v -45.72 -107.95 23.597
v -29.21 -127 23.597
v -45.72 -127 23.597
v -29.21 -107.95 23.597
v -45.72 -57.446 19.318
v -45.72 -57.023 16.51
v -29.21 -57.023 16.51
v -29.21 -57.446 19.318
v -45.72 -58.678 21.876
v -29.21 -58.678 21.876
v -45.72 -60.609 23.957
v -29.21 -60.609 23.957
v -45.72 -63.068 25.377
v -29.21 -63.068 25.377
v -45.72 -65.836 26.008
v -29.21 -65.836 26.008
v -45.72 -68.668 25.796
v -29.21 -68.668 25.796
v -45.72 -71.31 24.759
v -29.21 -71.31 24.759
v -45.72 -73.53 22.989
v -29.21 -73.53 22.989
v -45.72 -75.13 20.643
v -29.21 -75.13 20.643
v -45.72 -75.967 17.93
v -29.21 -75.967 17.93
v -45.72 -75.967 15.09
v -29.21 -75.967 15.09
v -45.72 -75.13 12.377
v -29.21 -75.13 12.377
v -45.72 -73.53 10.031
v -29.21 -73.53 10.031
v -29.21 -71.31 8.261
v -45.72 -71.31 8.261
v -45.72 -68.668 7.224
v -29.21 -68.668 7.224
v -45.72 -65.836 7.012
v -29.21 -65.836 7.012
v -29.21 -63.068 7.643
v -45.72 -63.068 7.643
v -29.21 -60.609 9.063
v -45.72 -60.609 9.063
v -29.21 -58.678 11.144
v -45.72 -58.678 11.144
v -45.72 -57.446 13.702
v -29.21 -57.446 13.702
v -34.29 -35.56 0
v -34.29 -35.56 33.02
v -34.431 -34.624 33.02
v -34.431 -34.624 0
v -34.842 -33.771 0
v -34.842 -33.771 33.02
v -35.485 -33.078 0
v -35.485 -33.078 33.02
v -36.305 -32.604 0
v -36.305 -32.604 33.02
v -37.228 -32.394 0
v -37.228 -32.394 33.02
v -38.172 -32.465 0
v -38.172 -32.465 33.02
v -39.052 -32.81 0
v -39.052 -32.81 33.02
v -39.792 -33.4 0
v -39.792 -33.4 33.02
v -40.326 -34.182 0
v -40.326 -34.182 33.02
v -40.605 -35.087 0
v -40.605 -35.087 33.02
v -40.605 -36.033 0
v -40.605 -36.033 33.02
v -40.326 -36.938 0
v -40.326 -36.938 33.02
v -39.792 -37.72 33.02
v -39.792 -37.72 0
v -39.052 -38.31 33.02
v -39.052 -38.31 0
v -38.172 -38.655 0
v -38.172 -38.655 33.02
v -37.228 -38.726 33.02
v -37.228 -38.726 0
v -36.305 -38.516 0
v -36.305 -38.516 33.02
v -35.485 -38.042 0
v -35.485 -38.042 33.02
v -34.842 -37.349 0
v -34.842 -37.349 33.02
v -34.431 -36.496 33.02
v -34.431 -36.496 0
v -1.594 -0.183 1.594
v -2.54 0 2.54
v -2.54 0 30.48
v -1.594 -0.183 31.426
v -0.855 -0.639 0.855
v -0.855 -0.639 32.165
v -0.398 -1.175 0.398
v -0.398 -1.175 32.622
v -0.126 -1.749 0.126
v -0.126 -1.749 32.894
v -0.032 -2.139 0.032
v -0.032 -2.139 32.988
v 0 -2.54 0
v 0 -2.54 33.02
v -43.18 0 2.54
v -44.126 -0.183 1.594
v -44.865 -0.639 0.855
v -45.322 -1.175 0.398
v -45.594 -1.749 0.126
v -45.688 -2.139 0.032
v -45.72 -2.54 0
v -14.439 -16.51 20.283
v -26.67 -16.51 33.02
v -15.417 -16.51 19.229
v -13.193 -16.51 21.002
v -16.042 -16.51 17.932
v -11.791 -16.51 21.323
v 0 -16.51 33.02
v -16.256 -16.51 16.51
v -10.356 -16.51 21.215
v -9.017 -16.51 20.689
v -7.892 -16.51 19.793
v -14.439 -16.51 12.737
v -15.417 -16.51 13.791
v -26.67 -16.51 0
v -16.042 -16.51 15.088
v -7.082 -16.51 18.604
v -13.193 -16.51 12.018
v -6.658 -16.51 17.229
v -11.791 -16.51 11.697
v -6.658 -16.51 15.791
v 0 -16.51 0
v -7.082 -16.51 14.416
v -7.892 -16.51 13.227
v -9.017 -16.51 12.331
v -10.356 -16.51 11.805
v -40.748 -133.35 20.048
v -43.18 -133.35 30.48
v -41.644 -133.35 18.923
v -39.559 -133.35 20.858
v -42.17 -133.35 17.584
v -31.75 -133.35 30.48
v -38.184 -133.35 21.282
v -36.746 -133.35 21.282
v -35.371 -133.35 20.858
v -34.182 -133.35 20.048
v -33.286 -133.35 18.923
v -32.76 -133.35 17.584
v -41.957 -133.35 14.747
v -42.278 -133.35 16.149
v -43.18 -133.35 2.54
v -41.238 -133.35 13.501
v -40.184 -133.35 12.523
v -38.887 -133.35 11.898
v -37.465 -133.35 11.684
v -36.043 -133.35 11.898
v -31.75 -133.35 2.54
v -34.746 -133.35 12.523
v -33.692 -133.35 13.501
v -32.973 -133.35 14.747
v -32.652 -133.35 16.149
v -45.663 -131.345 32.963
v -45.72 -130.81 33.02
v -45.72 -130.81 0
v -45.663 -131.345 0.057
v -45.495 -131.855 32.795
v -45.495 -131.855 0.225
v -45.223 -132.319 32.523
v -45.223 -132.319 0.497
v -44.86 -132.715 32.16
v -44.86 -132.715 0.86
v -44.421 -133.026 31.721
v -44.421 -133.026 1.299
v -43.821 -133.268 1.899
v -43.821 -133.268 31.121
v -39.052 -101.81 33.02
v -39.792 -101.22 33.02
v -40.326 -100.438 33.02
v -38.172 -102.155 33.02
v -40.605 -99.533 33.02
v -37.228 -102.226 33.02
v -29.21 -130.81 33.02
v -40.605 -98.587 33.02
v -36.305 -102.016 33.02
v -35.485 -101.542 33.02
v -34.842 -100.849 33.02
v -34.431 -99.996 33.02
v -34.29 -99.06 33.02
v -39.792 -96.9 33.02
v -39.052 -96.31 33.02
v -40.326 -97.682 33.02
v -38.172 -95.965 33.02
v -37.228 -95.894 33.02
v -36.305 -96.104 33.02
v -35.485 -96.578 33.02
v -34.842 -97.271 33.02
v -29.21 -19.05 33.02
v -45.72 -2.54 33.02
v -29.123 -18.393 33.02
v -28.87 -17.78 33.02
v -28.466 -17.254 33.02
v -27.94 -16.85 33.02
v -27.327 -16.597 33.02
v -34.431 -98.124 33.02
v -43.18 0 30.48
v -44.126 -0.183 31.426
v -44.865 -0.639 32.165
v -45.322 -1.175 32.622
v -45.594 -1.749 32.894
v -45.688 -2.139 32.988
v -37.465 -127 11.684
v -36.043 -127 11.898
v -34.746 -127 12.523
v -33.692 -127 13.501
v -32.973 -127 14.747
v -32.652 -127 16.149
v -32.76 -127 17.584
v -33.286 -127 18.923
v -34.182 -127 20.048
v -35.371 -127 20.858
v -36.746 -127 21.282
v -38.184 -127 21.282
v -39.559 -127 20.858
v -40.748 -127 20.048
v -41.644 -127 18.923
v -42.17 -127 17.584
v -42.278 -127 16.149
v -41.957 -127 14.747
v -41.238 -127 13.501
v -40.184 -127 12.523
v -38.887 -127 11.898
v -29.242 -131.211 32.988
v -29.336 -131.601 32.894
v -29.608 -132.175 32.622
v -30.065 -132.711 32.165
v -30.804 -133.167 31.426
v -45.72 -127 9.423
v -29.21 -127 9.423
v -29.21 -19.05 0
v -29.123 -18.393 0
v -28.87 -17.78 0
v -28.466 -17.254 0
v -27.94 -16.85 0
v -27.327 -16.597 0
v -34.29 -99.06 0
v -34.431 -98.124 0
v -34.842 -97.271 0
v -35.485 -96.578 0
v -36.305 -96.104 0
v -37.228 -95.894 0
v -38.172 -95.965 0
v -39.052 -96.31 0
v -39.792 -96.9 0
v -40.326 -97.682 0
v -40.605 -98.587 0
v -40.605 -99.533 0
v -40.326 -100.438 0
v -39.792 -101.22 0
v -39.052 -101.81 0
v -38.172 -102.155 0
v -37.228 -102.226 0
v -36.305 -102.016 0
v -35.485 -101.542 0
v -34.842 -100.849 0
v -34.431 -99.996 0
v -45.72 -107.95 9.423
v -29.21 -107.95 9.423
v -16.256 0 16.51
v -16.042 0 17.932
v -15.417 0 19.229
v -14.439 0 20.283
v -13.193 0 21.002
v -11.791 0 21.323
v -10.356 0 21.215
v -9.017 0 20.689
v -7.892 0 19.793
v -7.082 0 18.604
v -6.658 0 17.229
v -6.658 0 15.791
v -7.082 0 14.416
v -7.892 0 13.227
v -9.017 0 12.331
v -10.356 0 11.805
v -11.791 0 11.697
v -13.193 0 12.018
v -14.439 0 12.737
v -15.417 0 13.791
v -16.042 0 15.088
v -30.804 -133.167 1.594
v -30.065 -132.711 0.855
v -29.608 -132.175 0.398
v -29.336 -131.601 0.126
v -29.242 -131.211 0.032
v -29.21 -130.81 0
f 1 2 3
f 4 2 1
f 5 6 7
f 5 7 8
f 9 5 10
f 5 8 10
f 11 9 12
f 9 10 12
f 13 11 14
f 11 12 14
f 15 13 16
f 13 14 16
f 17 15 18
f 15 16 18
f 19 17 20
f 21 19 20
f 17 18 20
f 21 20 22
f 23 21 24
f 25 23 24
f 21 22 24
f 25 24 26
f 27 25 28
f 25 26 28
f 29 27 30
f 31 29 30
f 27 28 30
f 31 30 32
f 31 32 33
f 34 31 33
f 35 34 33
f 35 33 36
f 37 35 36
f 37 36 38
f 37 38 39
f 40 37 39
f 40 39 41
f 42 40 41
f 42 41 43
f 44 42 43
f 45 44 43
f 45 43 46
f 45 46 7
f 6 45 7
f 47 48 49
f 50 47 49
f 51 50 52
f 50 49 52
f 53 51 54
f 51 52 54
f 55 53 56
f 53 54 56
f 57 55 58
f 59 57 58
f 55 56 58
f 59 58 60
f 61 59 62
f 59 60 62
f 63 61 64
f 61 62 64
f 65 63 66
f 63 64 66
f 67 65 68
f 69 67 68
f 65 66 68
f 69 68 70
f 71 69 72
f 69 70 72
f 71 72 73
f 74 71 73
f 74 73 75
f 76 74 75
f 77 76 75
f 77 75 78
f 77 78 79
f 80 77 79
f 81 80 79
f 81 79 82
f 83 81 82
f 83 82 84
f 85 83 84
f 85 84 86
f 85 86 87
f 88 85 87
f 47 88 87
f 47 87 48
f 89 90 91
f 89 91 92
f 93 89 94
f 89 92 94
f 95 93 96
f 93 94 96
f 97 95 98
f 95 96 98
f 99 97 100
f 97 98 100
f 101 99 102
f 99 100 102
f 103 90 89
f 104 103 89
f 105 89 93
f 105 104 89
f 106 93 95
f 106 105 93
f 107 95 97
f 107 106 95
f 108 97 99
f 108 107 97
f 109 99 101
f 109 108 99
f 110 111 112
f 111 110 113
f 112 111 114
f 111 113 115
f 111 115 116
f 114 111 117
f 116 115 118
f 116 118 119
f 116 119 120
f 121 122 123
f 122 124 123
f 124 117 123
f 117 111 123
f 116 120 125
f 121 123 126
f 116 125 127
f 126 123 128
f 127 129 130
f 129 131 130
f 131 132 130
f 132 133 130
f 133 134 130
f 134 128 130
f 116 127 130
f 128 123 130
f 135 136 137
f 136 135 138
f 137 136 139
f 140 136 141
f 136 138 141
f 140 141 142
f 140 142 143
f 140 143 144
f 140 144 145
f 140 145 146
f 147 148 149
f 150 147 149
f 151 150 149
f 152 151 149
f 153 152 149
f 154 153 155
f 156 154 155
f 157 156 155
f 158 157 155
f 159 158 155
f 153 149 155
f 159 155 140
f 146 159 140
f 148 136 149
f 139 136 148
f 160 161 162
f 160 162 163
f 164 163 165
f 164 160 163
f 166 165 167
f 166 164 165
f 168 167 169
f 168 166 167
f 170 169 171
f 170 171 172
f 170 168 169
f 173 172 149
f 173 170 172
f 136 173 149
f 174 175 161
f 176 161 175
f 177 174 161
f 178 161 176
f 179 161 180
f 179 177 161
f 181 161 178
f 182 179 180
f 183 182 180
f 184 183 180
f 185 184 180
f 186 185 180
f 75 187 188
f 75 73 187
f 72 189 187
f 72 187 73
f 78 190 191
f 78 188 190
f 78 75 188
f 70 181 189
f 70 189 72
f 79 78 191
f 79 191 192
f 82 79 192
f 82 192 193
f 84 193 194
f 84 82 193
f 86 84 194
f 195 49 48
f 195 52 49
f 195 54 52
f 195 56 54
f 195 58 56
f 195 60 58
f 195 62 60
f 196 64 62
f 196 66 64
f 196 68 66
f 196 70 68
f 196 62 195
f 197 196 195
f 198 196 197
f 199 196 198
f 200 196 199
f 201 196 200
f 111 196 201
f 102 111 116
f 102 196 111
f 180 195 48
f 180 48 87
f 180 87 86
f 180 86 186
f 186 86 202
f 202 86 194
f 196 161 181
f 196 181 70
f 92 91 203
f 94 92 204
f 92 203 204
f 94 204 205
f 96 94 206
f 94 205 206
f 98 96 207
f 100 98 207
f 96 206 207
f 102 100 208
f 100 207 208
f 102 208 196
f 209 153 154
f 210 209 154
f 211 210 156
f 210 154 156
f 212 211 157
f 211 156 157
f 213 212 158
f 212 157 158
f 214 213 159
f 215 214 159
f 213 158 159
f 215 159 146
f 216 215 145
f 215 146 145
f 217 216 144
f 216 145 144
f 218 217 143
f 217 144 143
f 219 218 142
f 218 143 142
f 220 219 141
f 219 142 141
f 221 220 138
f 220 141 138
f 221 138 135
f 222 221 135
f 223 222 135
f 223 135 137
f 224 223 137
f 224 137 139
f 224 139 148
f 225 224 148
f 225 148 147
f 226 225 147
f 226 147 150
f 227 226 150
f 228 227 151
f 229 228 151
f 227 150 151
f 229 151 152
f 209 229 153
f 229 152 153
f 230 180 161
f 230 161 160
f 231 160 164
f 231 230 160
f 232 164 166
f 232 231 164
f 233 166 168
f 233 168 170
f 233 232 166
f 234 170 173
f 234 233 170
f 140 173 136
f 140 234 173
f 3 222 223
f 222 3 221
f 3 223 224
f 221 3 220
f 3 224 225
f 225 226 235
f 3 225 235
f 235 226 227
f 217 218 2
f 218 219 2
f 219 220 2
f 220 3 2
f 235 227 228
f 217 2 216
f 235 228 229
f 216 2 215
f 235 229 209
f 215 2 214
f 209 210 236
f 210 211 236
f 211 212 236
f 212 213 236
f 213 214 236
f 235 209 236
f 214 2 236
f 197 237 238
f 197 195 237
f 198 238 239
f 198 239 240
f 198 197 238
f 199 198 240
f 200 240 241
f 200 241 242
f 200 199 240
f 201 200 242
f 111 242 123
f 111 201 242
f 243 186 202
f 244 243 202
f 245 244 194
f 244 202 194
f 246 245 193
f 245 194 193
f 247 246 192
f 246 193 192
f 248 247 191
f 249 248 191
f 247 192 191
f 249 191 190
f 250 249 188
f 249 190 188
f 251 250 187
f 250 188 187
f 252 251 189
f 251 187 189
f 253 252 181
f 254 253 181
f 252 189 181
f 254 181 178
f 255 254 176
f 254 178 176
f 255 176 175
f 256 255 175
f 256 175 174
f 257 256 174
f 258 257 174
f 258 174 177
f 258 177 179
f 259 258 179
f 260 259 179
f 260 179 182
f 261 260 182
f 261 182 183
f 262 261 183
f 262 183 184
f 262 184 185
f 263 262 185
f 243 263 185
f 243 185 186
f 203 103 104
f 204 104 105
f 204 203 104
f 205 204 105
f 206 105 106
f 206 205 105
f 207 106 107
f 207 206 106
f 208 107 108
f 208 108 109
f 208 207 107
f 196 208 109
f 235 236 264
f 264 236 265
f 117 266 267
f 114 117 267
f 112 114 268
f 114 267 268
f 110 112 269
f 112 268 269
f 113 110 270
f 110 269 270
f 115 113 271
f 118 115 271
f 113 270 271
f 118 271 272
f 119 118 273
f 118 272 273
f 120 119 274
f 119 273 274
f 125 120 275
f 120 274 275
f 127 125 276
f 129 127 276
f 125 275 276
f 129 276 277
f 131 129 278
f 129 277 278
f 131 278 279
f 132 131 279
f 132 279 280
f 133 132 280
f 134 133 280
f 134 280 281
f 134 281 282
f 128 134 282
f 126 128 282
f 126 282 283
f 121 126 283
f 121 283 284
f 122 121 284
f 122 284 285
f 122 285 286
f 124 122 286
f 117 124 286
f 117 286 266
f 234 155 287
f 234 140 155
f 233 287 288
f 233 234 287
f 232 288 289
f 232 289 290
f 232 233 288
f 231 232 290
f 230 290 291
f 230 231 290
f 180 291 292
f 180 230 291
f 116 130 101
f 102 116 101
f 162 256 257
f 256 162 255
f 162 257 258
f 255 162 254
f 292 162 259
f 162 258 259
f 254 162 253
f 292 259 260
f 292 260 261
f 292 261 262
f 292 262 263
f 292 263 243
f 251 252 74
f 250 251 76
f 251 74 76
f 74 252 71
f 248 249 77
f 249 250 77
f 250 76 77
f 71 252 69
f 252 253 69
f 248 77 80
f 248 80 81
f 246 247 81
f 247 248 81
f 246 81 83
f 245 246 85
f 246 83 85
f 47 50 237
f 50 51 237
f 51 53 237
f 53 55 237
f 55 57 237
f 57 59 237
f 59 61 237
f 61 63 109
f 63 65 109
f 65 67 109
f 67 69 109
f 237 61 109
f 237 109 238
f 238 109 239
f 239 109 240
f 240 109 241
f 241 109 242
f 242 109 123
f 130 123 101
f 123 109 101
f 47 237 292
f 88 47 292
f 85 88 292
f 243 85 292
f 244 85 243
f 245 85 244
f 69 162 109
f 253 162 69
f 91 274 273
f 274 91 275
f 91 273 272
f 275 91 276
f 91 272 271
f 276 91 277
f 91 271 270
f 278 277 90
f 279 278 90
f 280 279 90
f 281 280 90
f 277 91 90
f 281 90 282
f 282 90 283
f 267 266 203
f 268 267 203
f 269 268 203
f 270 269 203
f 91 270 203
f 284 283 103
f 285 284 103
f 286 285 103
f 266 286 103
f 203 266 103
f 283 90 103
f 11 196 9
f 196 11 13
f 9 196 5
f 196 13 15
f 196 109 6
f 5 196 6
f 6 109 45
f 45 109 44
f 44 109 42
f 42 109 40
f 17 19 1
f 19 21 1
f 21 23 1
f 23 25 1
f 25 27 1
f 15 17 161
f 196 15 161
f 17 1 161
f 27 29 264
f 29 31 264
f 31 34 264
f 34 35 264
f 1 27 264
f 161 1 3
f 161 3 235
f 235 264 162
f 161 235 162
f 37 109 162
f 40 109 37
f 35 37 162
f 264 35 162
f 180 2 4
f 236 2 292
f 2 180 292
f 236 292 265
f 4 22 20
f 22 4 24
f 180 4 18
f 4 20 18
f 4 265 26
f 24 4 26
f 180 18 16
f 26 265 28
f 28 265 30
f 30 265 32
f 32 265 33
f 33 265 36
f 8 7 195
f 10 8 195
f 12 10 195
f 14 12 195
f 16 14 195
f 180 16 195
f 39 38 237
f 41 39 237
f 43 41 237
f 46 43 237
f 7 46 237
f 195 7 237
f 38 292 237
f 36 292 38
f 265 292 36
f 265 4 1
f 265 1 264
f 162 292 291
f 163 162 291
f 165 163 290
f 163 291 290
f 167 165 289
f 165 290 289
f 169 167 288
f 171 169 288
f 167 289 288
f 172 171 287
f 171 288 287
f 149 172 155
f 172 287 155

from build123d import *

# Parameters (mm, degrees)
BOSS_EXTRUDE1_DEPTH = 33.02
FILLET1_R           = 2.54
SKETCH4_R           = 9.525
CUT_EXTRUDE1_DEPTH  = 141.448449618
SKETCH5_R           = 3.175
CUT_EXTRUDE2_DEPTH  = 145.785570068
SKETCH6_W           = 14.1732
SKETCH6_H           = 19.05
CUT_EXTRUDE3_DEPTH  = 141.448449618
SKETCH7_R           = 4.826
CUT_EXTRUDE4_DEPTH  = 6.35
SKETCH8_R           = 4.826
CUT_EXTRUDE5_DEPTH  = 145.785570068
FILLET2_R           = 2.54
FILLET3_R           = 2.54


with BuildPart() as part:
    # Sketch1 → Boss-Extrude1 (new body)
    with BuildSketch(Plane.XY):
        Polygon((0, 0), (-45.72, 0), (-45.72, -133.35), (-29.21, -133.35), (-29.21, -16.51), (0, -16.51), align=None)
    extrude(amount=BOSS_EXTRUDE1_DEPTH)

    # Fillet1
    fillet1_edges = [part.edges().sort_by_distance(p)[0] for p in [
        (-45.72, 0, 16.51),
        (0, 0, 16.51),
        (-22.86, 0, 33.02),
        (-22.86, 0, 0),
    ]]
    fillet(fillet1_edges, radius=FILLET1_R)

    # Sketch4 → Cut-Extrude1 (cut, through all)
    with BuildSketch(Plane(origin=(-29.21, 0, 0), x_dir=(0, 0, -1), z_dir=(1, 0, 0))):
        with Locations(Location((-16.51, -66.548, 0), (0, 0, 90))):
            Circle(SKETCH4_R)
    extrude(amount=-CUT_EXTRUDE1_DEPTH, mode=Mode.SUBTRACT)

    # Sketch5 → Cut-Extrude2 (cut, through all)
    with BuildSketch(Plane.XY.offset(33.02)):
        with Locations((-37.465, -35.56)):
            Circle(SKETCH5_R)
        with Locations((-37.465, -99.06)):
            Circle(SKETCH5_R)
    extrude(amount=-CUT_EXTRUDE2_DEPTH, mode=Mode.SUBTRACT)

    # Sketch6 → Cut-Extrude3 (cut, through all)
    with BuildSketch(Plane(origin=(-29.21, 0, 0), x_dir=(0, 0, -1), z_dir=(1, 0, 0))):
        with Locations((-16.51, -117.475)):
            Rectangle(SKETCH6_W, SKETCH6_H)
    extrude(amount=-CUT_EXTRUDE3_DEPTH, mode=Mode.SUBTRACT)

    # Sketch7 → Cut-Extrude4 (cut)
    with BuildSketch(Plane.XZ.offset(133.35)):
        with Locations(Location((-37.465, 16.51, 0), (0, 0, 270))):
            Circle(SKETCH7_R)
    extrude(amount=-CUT_EXTRUDE4_DEPTH, mode=Mode.SUBTRACT)

    # Sketch8 → Cut-Extrude5 (cut, through all)
    with BuildSketch(Plane(origin=(0, 0, 0), x_dir=(1, 0, 0), z_dir=(0, 1, 0))):
        with Locations(Location((-11.43, -16.51, 0), (0, 0, 180))):
            Circle(SKETCH8_R)
    extrude(amount=-CUT_EXTRUDE5_DEPTH, mode=Mode.SUBTRACT)

    # Fillet2
    fillet2_edges = [part.edges().sort_by_distance(p)[0] for p in [
        (-29.21, -133.35, 16.51),
        (-45.72, -133.35, 16.51),
        (-37.465, -133.35, 33.02),
        (-37.465, -133.35, 0),
    ]]
    fillet(fillet2_edges, radius=FILLET2_R)

    # Fillet3
    fillet3_edges = [part.edges().sort_by_distance(p)[0] for p in [
        (-29.21, -16.51, 16.51),
    ]]
    fillet(fillet3_edges, radius=FILLET3_R)


solid = part.part
